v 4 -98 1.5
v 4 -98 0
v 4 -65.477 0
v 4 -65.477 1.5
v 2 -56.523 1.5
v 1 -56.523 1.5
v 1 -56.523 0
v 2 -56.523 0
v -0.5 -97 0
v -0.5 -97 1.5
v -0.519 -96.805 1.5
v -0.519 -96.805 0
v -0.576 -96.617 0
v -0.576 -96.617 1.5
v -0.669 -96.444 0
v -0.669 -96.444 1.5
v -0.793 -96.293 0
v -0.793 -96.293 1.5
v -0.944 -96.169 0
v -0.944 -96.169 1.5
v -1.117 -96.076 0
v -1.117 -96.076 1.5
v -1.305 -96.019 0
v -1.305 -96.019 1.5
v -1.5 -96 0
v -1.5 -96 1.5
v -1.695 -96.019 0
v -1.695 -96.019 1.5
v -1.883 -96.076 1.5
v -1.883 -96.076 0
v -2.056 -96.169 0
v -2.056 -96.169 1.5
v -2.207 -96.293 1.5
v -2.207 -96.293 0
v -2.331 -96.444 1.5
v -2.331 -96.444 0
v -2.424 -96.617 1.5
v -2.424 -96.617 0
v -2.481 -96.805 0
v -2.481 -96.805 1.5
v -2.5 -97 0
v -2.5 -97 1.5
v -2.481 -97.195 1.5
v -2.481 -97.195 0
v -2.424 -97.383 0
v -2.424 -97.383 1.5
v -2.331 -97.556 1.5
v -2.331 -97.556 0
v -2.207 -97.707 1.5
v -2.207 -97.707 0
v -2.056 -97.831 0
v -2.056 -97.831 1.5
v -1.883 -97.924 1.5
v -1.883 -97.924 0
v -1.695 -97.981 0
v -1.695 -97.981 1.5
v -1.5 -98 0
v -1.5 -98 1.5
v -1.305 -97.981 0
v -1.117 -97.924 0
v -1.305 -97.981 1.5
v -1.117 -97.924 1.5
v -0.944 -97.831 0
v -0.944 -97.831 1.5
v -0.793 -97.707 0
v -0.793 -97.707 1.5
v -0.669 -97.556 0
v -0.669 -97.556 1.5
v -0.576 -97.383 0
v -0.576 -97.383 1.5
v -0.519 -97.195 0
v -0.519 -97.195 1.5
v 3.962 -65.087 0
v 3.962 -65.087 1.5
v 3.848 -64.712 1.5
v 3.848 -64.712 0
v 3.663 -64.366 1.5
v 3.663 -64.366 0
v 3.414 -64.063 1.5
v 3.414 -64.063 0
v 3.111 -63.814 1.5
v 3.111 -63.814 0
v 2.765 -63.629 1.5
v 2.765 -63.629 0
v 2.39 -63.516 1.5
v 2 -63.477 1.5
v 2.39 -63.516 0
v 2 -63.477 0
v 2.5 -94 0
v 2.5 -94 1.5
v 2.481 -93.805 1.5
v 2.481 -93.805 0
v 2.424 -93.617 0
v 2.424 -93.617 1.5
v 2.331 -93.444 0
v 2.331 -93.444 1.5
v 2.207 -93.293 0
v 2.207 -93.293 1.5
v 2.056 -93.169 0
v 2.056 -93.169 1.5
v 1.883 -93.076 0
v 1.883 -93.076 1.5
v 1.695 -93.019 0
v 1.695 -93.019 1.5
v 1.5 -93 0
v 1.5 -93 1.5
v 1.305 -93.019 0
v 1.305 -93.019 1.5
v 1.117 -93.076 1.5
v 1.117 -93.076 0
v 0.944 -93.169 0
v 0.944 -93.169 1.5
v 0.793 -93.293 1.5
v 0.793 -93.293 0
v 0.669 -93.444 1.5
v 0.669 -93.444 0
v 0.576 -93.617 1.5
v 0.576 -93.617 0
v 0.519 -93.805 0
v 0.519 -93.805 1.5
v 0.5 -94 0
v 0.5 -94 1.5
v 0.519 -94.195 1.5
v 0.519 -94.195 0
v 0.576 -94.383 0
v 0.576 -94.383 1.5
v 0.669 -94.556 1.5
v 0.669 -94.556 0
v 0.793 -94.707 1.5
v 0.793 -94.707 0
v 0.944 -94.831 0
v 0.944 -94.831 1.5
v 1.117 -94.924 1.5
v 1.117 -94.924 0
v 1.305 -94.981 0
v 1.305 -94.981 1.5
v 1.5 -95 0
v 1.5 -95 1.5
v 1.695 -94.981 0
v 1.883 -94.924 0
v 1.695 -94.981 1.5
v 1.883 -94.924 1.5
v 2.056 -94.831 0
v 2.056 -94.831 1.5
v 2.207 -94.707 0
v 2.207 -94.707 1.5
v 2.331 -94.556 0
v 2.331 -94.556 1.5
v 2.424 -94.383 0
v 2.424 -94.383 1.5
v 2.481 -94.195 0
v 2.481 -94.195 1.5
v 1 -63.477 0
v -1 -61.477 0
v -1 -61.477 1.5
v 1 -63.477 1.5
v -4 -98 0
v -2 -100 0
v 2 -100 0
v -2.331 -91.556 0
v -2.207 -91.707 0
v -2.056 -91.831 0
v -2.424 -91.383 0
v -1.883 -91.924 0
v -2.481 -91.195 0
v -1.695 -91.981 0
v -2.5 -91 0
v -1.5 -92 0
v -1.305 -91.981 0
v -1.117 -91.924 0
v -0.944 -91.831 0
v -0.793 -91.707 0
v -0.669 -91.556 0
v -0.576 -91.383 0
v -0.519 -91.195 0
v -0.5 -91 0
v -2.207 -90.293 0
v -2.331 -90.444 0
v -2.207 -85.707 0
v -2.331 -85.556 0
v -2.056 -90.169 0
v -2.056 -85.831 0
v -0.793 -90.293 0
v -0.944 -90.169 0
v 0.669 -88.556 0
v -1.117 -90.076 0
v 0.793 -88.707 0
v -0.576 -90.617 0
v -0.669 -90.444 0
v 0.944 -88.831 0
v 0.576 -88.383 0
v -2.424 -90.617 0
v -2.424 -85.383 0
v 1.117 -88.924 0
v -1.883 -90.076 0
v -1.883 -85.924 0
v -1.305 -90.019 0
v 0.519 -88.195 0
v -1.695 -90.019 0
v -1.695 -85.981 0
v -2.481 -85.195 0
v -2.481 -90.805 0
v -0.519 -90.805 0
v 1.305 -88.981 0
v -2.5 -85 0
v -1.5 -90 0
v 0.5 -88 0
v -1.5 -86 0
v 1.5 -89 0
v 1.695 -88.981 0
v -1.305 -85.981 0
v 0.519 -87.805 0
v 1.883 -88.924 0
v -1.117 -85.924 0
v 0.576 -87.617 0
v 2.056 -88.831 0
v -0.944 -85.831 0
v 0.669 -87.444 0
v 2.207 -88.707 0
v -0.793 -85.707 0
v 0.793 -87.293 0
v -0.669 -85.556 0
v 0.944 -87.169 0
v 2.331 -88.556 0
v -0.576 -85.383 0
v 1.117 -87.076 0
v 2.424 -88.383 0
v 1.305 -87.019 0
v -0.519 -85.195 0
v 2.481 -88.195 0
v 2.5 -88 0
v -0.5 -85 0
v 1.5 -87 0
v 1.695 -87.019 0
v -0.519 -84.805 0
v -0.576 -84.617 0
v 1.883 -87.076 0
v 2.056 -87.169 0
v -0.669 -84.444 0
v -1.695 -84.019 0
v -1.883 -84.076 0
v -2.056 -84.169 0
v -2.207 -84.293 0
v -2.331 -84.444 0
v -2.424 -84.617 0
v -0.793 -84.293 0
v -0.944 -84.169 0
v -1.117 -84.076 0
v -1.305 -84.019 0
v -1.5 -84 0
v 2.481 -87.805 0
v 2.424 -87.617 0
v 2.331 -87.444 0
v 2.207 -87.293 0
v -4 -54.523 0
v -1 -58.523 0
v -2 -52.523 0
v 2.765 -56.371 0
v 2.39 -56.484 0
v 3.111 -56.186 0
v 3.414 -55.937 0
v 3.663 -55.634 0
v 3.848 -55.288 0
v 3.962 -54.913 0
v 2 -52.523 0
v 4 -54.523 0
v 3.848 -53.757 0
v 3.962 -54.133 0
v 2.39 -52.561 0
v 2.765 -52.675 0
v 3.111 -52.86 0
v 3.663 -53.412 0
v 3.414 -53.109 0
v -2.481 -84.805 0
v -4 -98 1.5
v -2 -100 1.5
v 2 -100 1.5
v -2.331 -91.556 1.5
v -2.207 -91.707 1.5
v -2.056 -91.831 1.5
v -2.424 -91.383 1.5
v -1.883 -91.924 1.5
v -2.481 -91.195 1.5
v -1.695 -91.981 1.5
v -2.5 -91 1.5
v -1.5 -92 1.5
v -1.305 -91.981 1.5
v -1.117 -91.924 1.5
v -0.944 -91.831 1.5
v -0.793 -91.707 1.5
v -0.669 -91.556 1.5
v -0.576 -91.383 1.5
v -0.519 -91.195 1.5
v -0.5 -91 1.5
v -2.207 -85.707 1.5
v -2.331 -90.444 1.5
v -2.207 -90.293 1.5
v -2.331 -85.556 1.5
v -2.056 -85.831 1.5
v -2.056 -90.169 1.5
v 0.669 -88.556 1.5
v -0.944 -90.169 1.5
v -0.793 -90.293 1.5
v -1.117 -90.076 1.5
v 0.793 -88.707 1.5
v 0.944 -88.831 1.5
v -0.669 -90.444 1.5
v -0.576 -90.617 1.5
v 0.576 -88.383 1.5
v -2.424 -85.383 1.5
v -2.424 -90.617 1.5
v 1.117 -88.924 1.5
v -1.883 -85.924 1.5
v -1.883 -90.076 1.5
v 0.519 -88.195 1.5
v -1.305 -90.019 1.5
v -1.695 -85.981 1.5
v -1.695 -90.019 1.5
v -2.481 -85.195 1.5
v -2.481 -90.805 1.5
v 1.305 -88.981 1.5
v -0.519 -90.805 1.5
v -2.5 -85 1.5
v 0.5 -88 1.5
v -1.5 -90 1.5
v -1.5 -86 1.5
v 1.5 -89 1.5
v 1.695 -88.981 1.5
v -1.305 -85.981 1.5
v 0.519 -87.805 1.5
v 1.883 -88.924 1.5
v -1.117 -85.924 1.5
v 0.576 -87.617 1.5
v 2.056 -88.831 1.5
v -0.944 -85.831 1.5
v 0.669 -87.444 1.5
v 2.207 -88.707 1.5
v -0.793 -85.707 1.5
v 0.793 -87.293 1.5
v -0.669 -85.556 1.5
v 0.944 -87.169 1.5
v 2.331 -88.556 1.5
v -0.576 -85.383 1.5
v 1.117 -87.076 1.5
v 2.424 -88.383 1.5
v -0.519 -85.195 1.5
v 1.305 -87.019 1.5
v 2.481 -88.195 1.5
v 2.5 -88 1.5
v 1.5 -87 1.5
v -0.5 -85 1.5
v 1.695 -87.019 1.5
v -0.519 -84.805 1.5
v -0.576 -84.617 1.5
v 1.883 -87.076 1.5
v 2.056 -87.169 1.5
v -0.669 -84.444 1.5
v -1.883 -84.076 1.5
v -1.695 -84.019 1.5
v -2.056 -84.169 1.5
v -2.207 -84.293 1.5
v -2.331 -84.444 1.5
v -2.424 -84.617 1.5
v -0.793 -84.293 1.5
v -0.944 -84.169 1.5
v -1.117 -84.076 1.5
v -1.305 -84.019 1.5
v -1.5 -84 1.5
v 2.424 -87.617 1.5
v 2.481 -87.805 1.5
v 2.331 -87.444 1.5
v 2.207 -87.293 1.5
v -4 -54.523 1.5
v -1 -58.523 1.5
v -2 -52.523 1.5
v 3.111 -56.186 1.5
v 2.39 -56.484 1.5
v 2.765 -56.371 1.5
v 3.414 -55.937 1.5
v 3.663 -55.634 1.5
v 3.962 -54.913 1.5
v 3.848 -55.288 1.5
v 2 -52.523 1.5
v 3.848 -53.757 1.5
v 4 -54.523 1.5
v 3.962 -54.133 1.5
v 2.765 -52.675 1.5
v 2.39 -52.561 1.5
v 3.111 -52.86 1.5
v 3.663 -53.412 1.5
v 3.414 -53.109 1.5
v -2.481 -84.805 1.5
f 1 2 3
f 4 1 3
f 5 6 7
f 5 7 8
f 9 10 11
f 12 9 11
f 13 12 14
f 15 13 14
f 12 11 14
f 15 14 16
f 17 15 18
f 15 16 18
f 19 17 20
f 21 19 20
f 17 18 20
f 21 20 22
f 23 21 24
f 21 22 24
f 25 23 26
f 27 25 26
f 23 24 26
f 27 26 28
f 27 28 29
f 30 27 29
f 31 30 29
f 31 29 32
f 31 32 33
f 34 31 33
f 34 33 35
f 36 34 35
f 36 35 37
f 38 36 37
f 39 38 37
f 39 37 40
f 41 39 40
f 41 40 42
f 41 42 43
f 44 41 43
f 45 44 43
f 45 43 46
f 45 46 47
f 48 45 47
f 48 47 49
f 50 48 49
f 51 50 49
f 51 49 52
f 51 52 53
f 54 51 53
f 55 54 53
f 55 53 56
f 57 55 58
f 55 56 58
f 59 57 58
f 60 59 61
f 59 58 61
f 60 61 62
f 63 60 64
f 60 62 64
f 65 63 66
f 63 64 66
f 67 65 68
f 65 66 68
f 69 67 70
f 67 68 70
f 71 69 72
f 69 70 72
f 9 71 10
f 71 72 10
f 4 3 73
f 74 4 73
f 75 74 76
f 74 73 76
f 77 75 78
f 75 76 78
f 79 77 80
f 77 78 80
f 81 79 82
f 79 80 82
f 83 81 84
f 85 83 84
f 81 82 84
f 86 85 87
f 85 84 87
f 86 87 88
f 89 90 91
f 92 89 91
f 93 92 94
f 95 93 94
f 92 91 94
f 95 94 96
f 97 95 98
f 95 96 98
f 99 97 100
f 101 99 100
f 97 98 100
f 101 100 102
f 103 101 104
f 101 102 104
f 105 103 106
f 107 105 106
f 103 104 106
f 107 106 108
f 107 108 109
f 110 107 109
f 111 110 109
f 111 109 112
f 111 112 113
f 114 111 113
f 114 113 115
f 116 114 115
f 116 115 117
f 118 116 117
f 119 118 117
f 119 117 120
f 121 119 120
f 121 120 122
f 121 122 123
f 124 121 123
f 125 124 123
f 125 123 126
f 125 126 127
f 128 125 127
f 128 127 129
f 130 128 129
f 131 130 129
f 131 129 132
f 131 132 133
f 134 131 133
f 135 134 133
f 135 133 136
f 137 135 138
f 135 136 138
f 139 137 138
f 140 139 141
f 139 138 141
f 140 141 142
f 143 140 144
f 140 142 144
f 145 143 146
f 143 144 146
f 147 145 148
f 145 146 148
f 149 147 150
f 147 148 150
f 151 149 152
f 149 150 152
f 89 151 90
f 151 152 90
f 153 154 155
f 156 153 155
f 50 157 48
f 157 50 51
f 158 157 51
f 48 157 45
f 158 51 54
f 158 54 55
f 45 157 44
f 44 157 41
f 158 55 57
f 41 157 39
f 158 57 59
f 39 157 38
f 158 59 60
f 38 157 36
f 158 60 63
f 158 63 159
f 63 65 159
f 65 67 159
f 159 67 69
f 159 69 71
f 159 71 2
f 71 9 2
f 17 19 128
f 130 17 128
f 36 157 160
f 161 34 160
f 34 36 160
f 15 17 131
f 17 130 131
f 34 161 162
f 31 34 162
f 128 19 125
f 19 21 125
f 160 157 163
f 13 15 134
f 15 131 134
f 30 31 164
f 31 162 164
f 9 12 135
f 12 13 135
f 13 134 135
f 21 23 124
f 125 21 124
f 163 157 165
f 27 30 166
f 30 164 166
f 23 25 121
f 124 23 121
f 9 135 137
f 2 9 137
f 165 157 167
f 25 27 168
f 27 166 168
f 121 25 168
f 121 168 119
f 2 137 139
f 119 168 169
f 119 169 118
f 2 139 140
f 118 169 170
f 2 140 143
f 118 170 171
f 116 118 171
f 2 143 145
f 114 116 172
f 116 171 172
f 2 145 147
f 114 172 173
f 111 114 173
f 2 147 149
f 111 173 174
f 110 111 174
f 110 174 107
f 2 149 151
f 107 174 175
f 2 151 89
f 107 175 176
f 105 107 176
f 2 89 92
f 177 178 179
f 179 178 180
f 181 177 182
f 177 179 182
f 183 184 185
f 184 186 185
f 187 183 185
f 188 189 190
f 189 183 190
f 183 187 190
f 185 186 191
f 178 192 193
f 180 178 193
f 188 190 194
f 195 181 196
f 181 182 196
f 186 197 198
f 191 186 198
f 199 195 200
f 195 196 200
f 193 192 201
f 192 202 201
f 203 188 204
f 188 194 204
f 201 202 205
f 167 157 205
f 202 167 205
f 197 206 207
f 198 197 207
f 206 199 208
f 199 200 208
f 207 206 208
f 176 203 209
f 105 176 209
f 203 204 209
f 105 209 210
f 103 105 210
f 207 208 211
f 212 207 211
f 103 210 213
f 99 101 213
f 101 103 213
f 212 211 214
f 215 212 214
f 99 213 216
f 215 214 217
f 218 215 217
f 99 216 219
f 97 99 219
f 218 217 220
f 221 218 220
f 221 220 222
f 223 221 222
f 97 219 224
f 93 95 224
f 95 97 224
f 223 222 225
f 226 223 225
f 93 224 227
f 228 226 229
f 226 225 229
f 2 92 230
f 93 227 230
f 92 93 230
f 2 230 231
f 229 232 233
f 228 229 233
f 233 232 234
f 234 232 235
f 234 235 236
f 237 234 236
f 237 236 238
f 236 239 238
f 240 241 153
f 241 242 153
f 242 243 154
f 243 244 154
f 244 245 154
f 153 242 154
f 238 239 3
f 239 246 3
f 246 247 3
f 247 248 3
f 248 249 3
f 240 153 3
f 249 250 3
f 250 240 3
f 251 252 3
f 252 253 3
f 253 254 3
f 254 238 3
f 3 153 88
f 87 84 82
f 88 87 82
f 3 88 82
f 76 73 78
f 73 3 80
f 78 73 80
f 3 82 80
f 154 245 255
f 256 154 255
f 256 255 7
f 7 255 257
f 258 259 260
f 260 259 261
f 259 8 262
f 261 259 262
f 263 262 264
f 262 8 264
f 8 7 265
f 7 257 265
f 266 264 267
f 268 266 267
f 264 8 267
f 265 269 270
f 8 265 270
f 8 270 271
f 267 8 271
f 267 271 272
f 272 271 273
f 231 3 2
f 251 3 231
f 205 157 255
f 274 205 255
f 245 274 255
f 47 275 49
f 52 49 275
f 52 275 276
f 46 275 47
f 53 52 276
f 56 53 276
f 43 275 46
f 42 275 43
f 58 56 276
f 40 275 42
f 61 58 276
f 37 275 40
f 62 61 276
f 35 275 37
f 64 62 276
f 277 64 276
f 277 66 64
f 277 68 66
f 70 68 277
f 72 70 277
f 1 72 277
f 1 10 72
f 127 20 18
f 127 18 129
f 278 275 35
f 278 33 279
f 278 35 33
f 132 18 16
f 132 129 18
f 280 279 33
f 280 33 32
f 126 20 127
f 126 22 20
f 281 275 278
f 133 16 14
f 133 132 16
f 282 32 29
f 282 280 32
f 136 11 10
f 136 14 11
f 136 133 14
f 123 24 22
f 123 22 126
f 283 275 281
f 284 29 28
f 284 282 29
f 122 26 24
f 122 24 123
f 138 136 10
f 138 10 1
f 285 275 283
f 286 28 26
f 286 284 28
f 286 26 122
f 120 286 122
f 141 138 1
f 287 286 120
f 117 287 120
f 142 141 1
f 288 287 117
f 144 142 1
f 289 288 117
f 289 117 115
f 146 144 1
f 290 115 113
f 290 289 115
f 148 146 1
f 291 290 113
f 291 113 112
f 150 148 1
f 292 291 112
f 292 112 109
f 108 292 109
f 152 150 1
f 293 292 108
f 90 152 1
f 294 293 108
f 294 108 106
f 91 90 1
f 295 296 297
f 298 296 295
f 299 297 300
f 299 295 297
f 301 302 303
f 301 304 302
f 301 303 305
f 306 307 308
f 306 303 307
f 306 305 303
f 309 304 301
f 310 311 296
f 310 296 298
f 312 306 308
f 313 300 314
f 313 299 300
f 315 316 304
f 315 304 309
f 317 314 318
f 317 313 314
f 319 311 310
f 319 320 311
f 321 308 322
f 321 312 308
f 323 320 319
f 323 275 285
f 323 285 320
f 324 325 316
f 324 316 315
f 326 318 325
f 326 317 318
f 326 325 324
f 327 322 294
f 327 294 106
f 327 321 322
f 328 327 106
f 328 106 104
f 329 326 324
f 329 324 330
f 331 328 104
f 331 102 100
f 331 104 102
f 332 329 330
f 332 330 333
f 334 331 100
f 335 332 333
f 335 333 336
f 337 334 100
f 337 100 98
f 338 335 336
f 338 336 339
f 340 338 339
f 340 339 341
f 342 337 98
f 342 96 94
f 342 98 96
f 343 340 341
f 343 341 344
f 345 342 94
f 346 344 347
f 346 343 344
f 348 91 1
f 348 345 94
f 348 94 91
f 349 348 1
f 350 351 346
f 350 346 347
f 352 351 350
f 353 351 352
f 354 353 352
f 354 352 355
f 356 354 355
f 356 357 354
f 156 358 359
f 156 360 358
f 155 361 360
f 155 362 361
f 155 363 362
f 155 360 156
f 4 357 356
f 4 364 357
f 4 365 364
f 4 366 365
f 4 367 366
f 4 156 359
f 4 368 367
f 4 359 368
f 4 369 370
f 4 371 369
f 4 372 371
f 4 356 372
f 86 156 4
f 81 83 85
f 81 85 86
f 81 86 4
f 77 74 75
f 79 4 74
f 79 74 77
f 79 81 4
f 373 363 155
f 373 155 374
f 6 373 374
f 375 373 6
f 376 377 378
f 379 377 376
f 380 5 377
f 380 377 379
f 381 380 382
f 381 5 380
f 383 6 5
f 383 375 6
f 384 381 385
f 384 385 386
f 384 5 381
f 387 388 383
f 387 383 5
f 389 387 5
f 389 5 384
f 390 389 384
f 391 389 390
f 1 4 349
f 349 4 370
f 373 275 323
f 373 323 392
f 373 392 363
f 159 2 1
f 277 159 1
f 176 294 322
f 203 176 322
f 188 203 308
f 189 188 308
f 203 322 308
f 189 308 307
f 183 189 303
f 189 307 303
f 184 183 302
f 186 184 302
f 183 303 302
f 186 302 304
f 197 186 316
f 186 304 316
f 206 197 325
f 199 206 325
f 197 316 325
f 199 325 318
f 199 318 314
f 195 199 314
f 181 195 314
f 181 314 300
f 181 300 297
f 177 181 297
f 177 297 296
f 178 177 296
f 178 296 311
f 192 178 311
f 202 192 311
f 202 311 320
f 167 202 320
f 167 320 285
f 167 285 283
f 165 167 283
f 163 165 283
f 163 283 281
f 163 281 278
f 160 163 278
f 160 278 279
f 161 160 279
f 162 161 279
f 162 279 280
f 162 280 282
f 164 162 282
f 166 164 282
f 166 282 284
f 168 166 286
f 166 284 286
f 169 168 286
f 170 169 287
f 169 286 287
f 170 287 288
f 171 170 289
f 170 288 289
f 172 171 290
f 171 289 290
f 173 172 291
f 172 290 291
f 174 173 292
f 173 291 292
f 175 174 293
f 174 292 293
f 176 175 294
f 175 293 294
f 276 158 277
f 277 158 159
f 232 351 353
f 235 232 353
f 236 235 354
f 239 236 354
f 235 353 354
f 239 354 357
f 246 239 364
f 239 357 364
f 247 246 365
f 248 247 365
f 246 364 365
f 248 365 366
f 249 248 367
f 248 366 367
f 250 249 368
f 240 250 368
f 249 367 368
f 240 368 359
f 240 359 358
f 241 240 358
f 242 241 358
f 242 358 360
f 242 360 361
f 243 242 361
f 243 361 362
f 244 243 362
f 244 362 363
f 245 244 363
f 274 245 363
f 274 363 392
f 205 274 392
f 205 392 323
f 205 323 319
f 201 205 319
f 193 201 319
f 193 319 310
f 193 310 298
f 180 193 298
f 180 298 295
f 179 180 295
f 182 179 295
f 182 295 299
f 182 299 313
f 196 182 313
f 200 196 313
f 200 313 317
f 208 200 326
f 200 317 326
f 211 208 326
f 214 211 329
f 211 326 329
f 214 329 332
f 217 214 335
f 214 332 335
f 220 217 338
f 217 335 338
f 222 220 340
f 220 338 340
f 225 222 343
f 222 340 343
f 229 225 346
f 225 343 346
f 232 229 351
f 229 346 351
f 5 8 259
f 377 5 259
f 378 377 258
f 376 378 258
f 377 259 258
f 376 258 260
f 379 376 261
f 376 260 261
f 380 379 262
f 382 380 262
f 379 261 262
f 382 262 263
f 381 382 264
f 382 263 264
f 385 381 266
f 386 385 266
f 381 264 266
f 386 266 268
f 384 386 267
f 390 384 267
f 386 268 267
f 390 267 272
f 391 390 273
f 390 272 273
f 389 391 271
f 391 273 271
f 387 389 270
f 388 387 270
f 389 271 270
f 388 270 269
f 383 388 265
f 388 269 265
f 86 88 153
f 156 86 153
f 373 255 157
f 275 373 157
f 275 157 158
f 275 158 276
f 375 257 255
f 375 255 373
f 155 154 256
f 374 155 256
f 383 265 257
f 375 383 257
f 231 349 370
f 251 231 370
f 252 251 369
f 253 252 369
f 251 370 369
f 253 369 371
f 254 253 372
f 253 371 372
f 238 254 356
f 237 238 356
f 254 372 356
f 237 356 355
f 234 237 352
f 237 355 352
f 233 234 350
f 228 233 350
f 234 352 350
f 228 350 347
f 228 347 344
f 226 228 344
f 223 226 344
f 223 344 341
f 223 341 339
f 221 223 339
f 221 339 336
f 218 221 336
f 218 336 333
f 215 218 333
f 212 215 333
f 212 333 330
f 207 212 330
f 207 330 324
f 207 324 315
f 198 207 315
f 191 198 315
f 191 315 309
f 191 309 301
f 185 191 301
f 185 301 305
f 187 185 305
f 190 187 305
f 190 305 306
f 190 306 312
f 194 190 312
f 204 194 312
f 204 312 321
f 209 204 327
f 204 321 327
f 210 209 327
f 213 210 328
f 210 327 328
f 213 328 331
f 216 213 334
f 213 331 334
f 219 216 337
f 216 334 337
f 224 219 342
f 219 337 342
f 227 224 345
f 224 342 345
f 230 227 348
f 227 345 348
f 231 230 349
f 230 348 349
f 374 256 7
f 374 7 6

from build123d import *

# Parameters (mm, degrees)
BOSS_EXTRUDE1_DEPTH = 1.5
SKETCH2_R           = 1
CUT_EXTRUDE1_DEPTH  = 5
CHAMFER1_SIZE       = 2


with BuildPart() as part:
    # Sketch1 → Boss-Extrude1 (new body)
    with BuildSketch(Plane.XY):
        with BuildLine():
            Line((-4, -100), (4, -100))
            Line((4, -100), (4, -65.477225575))
            ThreePointArc((4, -65.477225575), (3.414213562, -64.063012013), (2, -63.477225575))
            Line((2, -63.477225575), (-1, -63.477225575))
            Line((-1, -63.477225575), (-1, -56.522774425))
            Line((-1, -56.522774425), (2, -56.522774425))
            ThreePointArc((2, -56.522774425), (4, -54.522774425), (2, -52.522774425))
            Line((2, -52.522774425), (-4, -52.522774425))
            Line((-4, -52.522774425), (-4, -100))
        make_face()
    extrude(amount=BOSS_EXTRUDE1_DEPTH)

    # Sketch2 → Cut-Extrude1 (cut)
    with BuildSketch(Plane.XY.offset(1.5)):
        with Locations((-1.5, -97)):
            Circle(SKETCH2_R)
        with Locations((1.5, -94)):
            Circle(SKETCH2_R)
        with Locations((-1.5, -91)):
            Circle(SKETCH2_R)
        with Locations((-1.5, -85)):
            Circle(SKETCH2_R)
        with Locations((1.5, -88)):
            Circle(SKETCH2_R)
    extrude(amount=-CUT_EXTRUDE1_DEPTH, mode=Mode.SUBTRACT)

    # Chamfer1
    chamfer1_edges = [part.edges().sort_by_distance(p)[0] for p in [
        (-4, -52.522774425, 0.75),
        (-1, -56.522774425, 0.75),
        (-1, -63.477225575, 0.75),
        (4, -100, 0.75),
        (-4, -100, 0.75),
    ]]
    chamfer(chamfer1_edges, length=CHAMFER1_SIZE)


solid = part.part
